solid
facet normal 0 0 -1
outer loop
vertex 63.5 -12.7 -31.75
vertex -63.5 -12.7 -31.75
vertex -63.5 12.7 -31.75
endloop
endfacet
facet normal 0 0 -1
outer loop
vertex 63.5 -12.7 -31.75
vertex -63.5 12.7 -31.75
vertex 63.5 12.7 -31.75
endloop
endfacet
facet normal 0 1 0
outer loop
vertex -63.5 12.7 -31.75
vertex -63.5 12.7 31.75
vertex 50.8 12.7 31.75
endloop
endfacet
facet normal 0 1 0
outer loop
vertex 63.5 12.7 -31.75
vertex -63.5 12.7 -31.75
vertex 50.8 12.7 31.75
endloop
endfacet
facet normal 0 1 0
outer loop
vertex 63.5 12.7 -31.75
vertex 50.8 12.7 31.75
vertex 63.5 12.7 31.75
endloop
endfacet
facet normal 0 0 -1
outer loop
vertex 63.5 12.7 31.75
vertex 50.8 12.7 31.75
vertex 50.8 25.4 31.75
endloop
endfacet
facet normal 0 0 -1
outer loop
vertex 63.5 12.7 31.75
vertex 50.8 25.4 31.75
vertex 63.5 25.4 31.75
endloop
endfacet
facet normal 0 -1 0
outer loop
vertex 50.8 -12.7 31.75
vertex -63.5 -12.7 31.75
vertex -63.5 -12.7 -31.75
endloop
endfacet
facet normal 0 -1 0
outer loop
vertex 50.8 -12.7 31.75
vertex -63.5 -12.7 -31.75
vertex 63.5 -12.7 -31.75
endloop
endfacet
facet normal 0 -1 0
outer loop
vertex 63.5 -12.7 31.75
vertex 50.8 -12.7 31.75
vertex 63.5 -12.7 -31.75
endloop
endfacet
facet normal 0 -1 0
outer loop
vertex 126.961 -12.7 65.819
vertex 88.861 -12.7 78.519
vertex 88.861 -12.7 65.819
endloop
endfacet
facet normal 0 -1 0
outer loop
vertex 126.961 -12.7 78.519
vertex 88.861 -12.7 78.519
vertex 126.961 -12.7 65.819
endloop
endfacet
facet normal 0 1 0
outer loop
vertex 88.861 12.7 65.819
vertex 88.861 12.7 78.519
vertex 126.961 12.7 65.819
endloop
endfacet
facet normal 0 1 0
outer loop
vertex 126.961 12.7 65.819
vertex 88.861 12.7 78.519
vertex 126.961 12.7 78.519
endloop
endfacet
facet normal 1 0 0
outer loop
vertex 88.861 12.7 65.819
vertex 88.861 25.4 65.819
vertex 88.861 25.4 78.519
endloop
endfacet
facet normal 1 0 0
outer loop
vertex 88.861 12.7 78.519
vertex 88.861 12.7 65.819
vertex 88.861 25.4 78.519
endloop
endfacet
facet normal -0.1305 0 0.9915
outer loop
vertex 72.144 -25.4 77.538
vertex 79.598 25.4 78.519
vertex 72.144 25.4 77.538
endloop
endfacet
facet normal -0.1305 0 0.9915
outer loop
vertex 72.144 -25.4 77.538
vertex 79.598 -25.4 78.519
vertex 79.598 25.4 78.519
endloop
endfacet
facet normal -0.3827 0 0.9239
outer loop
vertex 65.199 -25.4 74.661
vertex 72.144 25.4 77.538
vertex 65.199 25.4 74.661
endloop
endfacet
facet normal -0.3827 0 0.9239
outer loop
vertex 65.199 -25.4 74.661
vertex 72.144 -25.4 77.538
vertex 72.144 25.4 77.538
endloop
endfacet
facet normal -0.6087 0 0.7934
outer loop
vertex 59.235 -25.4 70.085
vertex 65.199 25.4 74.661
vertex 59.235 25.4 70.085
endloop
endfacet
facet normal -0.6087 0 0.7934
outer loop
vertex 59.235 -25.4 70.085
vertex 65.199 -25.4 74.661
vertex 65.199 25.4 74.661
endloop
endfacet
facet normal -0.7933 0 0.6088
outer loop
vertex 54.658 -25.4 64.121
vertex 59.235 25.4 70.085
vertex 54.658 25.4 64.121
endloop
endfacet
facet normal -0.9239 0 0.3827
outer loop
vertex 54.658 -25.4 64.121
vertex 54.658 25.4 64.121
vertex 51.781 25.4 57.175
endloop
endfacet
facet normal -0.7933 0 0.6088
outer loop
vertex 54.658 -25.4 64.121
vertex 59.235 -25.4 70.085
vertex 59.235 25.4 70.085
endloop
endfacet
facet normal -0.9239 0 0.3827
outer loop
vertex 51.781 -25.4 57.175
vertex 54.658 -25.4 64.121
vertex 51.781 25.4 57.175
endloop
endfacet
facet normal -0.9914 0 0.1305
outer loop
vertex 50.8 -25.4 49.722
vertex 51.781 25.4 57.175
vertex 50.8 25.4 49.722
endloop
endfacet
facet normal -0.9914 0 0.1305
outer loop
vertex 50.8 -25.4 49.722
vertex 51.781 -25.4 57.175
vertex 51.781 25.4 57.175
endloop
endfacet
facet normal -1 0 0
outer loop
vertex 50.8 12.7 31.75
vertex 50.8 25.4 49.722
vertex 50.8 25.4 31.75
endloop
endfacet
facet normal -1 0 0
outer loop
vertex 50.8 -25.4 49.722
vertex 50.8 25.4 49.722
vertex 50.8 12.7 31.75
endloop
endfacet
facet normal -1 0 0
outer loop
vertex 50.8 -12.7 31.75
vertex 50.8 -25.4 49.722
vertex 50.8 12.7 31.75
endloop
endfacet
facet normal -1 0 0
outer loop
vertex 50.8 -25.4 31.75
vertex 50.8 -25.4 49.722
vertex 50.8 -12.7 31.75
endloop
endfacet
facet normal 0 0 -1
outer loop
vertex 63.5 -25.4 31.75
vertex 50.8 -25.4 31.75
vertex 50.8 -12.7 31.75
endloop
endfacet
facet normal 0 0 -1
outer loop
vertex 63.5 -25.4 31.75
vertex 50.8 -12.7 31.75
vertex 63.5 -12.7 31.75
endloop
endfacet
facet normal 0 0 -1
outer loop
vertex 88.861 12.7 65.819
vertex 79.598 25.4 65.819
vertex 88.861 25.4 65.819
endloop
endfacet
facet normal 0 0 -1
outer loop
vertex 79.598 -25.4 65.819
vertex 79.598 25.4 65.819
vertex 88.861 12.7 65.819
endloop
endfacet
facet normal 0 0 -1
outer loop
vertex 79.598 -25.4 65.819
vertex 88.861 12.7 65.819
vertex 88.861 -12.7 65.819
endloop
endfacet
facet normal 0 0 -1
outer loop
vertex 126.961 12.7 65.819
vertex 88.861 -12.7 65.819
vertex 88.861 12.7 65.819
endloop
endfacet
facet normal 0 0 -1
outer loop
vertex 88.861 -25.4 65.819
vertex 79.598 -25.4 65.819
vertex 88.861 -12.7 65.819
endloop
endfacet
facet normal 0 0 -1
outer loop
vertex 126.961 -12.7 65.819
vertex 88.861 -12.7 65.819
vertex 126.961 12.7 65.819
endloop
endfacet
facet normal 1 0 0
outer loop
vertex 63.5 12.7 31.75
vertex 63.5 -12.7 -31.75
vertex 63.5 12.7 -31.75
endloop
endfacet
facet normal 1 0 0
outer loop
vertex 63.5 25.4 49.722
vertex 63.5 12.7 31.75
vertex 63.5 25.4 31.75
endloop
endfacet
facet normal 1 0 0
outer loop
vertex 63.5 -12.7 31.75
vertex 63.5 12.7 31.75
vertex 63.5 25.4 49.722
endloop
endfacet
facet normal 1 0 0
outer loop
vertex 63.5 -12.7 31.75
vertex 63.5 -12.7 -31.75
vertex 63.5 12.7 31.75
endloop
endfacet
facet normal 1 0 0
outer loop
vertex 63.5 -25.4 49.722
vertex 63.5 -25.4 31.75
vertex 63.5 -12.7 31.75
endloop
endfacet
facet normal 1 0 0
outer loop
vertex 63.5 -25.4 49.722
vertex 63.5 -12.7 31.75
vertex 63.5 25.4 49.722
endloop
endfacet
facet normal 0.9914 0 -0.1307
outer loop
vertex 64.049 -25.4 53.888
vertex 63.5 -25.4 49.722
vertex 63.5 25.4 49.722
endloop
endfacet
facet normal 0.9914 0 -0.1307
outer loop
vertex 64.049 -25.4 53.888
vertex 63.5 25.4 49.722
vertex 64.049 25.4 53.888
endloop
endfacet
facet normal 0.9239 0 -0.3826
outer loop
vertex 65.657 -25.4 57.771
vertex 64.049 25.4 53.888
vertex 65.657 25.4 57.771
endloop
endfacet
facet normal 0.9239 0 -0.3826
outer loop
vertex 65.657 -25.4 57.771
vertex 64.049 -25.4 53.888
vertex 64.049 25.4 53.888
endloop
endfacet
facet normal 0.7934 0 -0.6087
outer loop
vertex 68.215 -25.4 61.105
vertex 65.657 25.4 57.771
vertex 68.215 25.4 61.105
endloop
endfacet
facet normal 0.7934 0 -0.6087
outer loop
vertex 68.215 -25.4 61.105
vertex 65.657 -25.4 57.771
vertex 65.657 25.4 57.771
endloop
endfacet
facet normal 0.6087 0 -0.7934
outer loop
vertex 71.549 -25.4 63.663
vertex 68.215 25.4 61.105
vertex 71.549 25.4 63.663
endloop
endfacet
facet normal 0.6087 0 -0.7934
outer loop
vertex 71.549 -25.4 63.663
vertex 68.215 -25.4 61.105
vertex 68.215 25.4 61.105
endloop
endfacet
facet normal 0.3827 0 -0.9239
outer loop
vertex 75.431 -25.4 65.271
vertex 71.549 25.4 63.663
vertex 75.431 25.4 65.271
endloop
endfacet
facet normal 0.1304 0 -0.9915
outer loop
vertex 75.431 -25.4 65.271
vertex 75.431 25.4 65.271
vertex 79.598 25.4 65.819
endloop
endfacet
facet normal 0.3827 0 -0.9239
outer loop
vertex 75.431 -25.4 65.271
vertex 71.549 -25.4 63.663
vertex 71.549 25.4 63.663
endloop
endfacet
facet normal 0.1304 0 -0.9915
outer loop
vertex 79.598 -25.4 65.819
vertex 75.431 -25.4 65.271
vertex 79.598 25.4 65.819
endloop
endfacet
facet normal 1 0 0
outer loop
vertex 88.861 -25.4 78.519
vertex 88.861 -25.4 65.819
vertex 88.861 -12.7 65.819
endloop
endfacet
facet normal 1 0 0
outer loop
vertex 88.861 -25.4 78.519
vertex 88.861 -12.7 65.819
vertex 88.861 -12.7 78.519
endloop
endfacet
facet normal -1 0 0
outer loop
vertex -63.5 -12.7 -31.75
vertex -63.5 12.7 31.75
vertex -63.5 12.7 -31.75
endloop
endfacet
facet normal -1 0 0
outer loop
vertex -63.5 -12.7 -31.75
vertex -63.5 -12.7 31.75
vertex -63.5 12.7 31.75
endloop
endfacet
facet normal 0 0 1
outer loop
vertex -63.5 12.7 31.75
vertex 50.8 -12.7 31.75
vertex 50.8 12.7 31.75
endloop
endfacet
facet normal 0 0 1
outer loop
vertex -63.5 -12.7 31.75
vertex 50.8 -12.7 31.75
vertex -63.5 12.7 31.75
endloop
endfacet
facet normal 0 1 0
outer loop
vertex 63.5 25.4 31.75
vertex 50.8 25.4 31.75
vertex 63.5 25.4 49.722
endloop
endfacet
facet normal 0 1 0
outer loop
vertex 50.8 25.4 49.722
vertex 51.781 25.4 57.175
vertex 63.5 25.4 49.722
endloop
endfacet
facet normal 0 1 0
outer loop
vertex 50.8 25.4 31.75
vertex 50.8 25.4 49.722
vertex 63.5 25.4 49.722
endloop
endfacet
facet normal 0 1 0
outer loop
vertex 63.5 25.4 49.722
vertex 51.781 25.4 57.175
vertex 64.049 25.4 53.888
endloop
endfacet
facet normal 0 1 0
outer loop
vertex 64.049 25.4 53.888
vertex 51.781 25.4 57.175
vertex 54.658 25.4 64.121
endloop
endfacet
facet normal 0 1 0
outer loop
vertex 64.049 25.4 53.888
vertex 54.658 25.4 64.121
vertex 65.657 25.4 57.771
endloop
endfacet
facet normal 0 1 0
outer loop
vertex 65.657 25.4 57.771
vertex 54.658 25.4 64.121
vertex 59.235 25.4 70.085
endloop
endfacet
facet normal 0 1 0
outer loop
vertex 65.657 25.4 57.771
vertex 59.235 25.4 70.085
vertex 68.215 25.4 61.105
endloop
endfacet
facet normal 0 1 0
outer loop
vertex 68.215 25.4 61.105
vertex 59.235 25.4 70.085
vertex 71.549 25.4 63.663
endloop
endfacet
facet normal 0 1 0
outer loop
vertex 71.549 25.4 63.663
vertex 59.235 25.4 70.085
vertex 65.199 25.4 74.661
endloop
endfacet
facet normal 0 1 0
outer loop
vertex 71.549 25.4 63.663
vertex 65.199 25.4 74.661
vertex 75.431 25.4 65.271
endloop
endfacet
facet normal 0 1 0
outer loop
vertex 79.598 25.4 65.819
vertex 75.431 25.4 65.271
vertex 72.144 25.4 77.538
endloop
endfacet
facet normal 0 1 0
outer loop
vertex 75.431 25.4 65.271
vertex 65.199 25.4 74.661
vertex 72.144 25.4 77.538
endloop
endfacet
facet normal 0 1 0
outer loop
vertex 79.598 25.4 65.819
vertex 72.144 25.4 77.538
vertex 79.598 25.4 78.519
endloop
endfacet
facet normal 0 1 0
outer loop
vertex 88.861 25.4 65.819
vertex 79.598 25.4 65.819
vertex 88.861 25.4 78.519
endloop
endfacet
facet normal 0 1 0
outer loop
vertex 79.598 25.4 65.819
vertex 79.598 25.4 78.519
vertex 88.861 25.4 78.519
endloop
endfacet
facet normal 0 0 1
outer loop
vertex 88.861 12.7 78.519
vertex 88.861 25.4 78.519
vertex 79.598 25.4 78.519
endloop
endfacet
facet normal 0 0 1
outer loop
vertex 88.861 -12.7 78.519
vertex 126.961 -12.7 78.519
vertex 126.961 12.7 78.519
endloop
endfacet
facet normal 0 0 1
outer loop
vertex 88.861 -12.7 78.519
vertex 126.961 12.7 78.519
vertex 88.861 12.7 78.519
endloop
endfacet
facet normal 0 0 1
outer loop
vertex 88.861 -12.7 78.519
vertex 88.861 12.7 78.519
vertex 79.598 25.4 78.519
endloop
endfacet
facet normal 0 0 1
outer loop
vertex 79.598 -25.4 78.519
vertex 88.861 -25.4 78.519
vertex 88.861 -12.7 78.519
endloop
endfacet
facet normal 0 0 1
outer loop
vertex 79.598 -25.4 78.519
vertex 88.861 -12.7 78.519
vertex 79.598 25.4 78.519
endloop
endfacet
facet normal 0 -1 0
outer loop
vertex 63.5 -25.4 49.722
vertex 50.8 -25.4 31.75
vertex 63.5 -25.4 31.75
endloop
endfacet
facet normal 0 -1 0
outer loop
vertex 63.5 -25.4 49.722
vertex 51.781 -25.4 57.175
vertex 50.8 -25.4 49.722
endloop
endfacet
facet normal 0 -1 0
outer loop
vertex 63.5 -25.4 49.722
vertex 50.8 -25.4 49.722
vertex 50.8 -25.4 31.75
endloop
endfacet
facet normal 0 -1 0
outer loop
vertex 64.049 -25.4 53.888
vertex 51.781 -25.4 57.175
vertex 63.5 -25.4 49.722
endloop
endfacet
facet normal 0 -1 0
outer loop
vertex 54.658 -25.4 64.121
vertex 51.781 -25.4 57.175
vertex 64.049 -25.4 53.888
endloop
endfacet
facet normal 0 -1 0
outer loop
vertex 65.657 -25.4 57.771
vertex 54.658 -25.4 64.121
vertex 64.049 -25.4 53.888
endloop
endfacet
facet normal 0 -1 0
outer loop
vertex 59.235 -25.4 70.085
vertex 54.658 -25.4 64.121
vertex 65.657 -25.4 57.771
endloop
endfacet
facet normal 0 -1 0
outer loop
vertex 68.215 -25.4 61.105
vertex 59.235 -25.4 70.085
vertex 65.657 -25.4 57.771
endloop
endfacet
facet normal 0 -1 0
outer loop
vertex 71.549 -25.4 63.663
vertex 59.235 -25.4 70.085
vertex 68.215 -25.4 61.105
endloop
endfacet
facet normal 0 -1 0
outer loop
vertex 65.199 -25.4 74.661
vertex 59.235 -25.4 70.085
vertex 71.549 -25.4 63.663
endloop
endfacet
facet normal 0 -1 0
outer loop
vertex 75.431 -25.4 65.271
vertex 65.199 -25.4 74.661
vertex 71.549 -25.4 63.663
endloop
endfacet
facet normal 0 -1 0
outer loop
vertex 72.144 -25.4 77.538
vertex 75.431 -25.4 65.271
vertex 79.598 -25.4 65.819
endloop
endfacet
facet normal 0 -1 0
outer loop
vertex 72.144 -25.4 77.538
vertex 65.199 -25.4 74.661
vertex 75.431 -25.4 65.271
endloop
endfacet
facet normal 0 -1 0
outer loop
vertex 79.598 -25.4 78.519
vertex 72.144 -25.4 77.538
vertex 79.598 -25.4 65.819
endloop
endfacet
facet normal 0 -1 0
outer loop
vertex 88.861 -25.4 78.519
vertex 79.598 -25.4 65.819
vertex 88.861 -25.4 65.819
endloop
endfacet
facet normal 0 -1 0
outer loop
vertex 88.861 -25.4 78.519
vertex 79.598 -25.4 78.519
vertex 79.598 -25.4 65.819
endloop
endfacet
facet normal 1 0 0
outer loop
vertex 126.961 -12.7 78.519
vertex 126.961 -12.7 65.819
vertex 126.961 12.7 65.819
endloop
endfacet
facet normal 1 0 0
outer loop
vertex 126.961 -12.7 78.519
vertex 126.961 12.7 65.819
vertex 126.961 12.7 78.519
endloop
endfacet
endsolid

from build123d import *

# Parameters (mm, degrees)
F1_DEPTH = 12.7
F2_DEPTH = 25.4
F0_W     = 38.1
F0_H     = 12.7
F3_DEPTH = 12.7


with BuildPart() as f1:
    # F0 (on Front) → F1 (new body, symmetric)
    with BuildSketch(Plane.XZ):
        Polygon((-63.5, 31.75), (-63.5, -31.75), (63.5, -31.75), (63.5, 31.75), (50.8, 31.75), align=None)
    extrude(amount=F1_DEPTH, both=True)

    # F0 (on Front) → F2 (join, symmetric)
    with BuildSketch(Plane.XZ):
        with BuildLine():
            Line((50.8, 31.75), (63.5, 31.75))
            Line((63.5, 31.75), (63.5, 49.721827))
            ThreePointArc((63.5, 49.721827), (68.214881, 61.104556), (79.59761, 65.819437))
            Line((79.59761, 65.819437), (88.861028, 65.819437))
            Line((88.861028, 65.819437), (88.861028, 78.519437))
            Line((88.861028, 78.519437), (79.59761, 78.519437))
            ThreePointArc((79.59761, 78.519437), (59.234625, 70.084812), (50.8, 49.721827))
            Line((50.8, 49.721827), (50.8, 31.75))
        make_face()
    extrude(amount=F2_DEPTH, both=True)

    # F0 (on Front) → F3 (join, symmetric)
    with BuildSketch(Plane.XZ):
        with Locations((107.911028, 72.169437)):
            Rectangle(F0_W, F0_H)
    extrude(amount=F3_DEPTH, both=True)


solid = f1.part
